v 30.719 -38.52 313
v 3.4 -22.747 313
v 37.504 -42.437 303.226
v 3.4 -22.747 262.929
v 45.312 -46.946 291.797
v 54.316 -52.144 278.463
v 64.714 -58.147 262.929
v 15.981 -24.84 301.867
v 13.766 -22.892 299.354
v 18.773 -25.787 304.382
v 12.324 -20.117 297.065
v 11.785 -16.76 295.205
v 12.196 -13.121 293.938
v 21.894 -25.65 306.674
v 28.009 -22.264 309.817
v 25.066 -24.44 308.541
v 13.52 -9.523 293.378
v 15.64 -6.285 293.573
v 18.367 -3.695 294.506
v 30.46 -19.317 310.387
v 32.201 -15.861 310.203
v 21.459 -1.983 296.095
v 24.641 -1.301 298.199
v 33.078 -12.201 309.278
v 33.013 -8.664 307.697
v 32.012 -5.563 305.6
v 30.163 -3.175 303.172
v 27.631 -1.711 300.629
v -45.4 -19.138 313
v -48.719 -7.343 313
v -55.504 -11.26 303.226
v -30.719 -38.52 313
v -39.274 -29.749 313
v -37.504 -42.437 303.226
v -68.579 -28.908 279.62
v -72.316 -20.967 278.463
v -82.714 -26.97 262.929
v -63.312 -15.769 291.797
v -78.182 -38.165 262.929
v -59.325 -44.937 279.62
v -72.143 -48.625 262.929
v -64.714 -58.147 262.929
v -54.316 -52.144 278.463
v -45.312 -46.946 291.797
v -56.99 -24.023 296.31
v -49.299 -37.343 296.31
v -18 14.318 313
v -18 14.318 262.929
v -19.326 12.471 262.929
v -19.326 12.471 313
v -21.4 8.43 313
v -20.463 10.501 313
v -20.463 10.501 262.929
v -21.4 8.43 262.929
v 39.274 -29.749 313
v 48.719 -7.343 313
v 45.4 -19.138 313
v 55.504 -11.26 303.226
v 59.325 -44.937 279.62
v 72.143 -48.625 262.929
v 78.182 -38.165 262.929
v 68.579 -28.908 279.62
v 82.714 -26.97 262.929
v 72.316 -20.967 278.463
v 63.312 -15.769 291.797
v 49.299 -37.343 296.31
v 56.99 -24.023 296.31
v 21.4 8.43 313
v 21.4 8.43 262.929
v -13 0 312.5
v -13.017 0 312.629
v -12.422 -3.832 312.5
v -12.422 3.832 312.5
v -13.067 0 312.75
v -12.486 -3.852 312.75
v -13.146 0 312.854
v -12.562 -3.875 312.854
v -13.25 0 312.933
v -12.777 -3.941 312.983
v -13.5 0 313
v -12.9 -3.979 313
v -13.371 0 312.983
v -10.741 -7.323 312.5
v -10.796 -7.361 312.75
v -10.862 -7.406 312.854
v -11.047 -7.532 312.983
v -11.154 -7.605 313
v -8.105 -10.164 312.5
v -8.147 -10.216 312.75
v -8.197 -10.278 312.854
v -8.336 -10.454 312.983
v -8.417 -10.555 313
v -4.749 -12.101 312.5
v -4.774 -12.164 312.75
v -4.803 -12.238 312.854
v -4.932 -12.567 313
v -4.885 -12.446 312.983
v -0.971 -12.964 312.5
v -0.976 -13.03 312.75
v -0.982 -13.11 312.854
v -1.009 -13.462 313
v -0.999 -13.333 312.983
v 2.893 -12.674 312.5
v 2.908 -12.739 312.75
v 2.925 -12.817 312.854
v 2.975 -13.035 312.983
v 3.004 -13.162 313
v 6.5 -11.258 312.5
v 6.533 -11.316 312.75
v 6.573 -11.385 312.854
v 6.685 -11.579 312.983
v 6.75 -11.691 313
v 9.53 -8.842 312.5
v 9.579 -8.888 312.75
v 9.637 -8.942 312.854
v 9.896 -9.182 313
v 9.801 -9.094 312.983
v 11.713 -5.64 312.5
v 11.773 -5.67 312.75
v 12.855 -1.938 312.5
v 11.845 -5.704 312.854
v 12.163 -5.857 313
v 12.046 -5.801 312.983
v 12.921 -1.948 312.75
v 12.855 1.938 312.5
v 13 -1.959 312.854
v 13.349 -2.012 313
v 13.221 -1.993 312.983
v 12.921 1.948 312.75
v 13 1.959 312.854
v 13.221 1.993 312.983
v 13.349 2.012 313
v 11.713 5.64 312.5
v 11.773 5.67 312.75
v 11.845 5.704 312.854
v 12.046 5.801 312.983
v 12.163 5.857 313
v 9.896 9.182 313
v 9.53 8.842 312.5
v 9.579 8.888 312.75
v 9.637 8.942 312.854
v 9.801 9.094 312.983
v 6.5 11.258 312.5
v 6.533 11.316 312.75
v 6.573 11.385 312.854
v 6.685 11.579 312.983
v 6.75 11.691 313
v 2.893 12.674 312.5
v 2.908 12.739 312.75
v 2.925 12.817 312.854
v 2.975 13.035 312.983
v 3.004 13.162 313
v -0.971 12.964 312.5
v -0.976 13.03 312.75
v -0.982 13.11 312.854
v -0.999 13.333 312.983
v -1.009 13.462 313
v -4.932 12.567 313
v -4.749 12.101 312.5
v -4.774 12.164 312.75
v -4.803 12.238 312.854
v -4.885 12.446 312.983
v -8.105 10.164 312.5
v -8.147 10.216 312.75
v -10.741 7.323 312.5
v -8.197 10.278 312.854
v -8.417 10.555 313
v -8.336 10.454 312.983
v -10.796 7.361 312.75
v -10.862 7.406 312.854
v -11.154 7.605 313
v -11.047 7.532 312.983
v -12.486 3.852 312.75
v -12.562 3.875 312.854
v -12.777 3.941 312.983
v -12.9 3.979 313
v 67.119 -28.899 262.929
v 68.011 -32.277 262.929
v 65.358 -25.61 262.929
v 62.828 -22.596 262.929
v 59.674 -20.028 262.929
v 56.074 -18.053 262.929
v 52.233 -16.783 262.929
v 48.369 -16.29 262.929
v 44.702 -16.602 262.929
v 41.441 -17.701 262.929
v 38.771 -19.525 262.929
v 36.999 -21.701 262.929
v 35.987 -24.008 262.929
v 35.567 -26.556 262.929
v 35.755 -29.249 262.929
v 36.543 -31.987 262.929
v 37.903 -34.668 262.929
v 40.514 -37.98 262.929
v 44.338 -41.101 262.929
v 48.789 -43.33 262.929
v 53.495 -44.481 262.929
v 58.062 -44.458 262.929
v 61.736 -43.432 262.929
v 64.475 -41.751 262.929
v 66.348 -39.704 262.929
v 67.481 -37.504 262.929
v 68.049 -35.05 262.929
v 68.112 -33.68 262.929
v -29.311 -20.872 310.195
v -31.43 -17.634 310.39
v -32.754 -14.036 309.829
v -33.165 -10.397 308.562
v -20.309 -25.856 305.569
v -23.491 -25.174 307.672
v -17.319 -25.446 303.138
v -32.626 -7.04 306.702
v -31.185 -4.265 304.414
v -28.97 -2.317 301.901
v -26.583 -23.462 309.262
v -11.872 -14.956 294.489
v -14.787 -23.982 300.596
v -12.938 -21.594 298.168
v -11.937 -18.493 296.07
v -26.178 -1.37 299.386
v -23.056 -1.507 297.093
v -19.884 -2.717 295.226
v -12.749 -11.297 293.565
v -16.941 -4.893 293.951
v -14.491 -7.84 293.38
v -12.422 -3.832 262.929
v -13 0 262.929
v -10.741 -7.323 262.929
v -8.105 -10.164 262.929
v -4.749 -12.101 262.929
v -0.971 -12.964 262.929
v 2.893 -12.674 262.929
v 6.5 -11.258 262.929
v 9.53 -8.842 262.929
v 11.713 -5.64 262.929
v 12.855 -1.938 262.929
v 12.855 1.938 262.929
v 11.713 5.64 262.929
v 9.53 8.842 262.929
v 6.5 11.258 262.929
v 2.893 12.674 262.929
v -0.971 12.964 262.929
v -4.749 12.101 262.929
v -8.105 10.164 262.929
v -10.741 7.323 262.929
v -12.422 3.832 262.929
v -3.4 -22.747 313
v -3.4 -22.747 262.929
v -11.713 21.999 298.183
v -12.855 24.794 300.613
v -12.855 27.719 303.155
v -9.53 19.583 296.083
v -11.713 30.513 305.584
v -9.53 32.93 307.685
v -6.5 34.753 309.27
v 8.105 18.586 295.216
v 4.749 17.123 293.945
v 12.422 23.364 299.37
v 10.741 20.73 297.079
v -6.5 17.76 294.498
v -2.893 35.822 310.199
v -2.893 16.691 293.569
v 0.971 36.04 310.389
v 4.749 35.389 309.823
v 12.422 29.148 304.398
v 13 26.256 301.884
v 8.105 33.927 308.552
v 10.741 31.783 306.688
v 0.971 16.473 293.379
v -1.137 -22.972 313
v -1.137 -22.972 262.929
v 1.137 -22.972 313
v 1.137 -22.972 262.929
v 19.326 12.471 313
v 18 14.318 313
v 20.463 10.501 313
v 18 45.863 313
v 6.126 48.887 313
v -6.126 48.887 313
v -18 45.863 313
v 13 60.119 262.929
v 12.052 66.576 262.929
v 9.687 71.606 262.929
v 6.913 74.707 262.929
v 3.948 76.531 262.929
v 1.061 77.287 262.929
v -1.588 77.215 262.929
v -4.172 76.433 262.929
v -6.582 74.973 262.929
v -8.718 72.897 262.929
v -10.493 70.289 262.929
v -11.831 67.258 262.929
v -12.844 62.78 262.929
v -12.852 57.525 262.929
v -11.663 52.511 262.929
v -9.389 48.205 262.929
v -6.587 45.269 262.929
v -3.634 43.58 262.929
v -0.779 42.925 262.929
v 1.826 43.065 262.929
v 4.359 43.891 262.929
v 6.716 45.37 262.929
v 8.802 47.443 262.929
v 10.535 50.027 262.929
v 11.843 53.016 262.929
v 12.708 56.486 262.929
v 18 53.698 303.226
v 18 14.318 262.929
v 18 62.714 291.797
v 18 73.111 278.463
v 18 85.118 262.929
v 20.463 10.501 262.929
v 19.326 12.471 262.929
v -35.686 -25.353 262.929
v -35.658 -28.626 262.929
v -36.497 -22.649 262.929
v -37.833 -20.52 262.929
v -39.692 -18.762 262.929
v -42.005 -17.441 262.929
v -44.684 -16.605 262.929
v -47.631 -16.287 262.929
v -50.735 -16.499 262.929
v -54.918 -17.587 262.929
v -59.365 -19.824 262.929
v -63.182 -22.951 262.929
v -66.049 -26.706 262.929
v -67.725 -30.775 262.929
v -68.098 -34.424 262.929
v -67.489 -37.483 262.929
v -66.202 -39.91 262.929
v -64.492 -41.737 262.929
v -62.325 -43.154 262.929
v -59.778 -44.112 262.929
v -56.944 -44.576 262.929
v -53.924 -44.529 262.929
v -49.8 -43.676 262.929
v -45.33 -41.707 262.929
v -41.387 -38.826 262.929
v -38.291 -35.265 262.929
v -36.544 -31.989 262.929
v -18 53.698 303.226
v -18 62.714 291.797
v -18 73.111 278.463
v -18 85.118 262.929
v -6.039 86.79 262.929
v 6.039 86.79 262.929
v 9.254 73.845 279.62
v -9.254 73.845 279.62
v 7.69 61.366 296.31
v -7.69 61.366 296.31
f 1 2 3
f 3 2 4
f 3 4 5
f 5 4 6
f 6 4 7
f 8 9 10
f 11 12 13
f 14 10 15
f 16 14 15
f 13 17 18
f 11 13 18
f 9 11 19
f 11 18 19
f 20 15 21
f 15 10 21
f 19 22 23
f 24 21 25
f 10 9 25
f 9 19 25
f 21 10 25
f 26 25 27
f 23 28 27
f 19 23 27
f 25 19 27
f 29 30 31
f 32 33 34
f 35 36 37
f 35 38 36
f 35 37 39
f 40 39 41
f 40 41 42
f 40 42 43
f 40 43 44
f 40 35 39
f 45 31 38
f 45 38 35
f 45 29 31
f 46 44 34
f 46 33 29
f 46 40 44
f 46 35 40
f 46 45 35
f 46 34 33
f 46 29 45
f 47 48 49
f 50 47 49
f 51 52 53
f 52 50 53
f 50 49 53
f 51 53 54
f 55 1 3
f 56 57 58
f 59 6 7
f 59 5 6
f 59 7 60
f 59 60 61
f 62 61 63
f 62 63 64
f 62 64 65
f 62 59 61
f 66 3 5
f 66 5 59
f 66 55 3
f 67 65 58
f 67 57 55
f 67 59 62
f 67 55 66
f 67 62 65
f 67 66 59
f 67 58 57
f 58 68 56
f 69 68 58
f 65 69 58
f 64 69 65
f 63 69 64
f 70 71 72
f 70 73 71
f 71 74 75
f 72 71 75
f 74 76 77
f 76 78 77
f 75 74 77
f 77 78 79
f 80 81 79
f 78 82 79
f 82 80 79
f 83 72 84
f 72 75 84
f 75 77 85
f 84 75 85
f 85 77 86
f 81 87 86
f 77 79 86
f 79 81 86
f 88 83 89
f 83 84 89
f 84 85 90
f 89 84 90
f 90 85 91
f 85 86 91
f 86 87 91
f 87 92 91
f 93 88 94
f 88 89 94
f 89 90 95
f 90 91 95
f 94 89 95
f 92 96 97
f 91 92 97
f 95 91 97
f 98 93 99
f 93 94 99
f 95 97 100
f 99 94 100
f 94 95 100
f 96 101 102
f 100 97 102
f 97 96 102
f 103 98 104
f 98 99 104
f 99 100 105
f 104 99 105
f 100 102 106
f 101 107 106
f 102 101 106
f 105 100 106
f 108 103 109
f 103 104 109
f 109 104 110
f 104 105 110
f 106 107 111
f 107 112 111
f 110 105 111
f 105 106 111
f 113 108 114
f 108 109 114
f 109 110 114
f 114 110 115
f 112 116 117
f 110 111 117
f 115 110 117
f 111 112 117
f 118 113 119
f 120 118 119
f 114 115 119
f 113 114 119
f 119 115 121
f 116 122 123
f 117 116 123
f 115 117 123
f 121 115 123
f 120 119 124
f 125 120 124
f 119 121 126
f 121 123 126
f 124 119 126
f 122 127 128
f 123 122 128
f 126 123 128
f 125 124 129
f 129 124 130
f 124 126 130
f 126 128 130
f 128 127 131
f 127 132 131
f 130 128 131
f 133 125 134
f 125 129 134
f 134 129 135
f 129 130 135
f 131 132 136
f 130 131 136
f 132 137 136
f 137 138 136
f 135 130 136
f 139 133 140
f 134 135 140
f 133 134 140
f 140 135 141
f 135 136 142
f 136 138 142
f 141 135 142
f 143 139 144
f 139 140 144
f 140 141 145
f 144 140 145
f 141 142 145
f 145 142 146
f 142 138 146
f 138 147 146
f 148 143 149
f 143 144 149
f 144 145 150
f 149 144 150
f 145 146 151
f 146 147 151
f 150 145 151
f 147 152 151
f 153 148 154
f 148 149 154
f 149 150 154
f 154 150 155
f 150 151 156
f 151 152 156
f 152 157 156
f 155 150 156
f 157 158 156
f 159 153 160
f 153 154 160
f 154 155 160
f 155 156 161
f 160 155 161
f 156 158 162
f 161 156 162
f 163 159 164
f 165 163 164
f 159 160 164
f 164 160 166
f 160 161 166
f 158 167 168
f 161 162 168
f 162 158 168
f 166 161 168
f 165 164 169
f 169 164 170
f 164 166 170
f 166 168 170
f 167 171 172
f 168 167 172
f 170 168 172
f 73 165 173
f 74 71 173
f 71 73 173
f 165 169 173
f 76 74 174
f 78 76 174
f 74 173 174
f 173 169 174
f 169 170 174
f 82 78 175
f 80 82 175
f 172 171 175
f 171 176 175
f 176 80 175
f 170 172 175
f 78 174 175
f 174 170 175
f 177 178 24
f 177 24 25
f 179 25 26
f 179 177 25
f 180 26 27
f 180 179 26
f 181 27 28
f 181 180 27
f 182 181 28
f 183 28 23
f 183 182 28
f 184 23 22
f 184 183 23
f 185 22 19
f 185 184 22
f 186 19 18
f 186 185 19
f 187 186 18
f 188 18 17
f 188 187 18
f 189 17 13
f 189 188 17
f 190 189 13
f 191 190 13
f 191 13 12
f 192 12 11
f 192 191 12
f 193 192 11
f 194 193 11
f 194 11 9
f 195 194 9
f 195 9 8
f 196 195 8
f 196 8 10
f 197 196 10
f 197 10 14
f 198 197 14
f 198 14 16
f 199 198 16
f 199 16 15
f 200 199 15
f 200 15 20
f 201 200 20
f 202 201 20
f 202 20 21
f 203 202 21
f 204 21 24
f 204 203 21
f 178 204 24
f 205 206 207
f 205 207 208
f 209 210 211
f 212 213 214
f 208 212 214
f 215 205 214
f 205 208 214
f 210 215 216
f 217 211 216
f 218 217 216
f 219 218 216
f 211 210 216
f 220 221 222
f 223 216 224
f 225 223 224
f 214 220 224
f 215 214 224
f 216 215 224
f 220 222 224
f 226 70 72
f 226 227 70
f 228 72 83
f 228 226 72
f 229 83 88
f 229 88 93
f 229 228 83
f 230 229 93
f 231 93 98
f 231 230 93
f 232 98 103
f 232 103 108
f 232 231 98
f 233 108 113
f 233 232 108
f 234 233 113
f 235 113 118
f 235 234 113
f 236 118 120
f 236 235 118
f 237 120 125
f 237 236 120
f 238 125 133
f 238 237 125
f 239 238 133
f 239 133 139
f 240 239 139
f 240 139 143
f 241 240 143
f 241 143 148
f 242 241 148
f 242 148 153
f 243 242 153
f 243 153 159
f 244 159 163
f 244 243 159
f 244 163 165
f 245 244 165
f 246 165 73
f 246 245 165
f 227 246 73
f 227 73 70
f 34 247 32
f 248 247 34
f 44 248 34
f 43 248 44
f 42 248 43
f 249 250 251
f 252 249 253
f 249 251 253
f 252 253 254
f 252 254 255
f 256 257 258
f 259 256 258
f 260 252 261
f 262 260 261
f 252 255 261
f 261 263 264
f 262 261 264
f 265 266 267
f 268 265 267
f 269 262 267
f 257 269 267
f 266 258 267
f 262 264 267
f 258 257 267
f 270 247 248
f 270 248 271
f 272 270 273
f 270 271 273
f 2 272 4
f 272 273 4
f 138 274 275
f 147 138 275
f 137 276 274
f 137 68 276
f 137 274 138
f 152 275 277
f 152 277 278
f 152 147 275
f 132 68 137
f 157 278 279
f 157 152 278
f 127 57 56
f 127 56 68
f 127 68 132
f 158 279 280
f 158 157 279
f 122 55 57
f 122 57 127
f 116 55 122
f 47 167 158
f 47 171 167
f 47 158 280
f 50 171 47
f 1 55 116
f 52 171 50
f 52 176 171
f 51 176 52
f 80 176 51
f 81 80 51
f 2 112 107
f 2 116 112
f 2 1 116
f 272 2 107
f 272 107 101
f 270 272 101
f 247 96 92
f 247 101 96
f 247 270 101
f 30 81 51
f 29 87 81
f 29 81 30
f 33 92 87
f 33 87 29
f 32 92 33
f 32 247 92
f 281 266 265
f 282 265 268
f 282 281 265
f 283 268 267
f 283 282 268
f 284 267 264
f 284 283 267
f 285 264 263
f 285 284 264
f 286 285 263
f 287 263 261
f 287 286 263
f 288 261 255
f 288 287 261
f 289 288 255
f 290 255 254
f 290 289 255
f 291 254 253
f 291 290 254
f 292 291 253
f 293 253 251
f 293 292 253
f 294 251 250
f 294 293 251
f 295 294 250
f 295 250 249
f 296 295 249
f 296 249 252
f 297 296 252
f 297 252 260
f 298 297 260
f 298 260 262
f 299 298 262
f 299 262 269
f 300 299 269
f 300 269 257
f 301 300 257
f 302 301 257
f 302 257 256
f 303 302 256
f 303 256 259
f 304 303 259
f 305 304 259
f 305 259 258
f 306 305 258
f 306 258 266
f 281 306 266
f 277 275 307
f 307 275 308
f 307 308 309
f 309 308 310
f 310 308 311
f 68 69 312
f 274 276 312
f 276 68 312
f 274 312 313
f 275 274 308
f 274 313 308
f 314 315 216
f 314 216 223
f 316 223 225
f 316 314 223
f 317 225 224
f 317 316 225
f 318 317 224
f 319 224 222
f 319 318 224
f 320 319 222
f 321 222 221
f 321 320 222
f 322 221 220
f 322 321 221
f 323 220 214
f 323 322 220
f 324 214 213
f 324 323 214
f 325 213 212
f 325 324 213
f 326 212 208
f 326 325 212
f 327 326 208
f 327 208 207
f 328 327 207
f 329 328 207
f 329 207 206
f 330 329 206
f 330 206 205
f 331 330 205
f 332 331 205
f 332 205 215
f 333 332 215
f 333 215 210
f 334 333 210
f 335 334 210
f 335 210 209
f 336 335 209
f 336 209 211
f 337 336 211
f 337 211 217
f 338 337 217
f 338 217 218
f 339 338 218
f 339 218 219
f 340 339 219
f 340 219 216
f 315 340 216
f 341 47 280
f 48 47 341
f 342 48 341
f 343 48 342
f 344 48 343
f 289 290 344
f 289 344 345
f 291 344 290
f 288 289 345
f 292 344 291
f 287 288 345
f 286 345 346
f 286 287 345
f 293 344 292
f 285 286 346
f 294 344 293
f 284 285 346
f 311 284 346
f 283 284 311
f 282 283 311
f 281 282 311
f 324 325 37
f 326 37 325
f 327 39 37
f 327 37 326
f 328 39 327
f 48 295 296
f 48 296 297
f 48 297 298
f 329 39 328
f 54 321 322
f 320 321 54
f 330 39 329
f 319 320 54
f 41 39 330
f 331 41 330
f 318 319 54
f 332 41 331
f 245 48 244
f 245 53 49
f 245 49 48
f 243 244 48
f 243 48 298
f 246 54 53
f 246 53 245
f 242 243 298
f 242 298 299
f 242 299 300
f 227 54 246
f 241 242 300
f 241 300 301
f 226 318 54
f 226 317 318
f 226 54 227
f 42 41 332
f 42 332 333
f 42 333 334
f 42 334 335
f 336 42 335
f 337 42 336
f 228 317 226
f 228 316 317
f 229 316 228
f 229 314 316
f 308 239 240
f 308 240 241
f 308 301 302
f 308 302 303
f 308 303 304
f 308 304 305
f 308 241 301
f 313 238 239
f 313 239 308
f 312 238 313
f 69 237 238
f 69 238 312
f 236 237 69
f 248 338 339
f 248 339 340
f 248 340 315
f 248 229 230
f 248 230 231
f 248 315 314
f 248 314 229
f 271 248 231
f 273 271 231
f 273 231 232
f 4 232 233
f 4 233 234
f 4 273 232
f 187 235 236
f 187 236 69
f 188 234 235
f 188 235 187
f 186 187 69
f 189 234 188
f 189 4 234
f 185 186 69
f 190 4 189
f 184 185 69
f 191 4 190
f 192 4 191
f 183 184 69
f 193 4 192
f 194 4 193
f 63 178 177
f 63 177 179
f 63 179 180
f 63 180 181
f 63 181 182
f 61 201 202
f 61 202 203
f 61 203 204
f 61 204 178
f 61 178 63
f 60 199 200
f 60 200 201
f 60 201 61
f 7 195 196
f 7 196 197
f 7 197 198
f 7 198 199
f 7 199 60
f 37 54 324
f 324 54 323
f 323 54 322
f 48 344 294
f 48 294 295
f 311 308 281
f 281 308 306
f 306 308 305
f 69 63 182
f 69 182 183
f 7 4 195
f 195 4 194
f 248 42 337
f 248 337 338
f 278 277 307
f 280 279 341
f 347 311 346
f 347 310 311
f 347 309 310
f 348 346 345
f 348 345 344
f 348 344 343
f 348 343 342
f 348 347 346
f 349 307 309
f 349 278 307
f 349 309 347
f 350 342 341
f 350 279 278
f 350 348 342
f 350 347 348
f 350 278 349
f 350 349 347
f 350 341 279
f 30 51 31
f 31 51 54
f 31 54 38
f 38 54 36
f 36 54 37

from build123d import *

# Parameters (mm, degrees)
PAD003_DEPTH                = 100
PAD002_DEPTH                = 100
PAD001_DEPTH                = 100
CYLINDER009_R               = 13
CYLINDER009_DEPTH           = 400
CYLINDER009_ROLL_ANGLE      = -23.419924
CYLINDER009_PITCH_ANGLE     = -34.667447
CYLINDER009_PLACEMENT_ANGLE = 7.402808
CYLINDER012_R               = 13
CYLINDER012_DEPTH           = 400
CYLINDER012_PLACEMENT_ANGLE = 41
CYLINDER013_R               = 13
CYLINDER013_DEPTH           = 400
CYLINDER013_ROLL_ANGLE      = -23.419924
CYLINDER013_PITCH_ANGLE     = 34.667447
CYLINDER013_PLACEMENT_ANGLE = -7.402808


with BuildPart() as body004:
    # Sketch005 → Pad003 (new body)
    with BuildSketch(Plane.XY):
        with BuildLine():
            ThreePointArc((86.165943, -28.96332), (78.724727, 45.451743), (18, 89.103555))
            Line((18, 14.317821), (18, 89.103555))
            ThreePointArc((21.399597, 8.429547), (19.918584, 11.5), (18, 14.317821))
            Line((21.399597, 8.429547), (86.165943, -28.96332))
        make_face()
    extrude(amount=PAD003_DEPTH)


with BuildPart() as body003:
    # Sketch006 → Pad002 (new body)
    with BuildSketch(Plane.XY):
        with BuildLine():
            Line((-3.399597, -22.747368), (-68.165943, -60.140235))
            ThreePointArc((-68.165943, -60.140235), (0, -90.903485), (68.165943, -60.140235))
            Line((3.399597, -22.747368), (68.165943, -60.140235))
            ThreePointArc((-3.399597, -22.747368), (0, -23), (3.399597, -22.747368))
        make_face()
    extrude(amount=PAD002_DEPTH)


with BuildPart() as fusion002:
    # Sketch004 → Pad001 (new body)
    with BuildSketch(Plane.XY):
        with BuildLine():
            Line((-21.399597, 8.429547), (-86.165943, -28.96332))
            ThreePointArc((-18, 89.103555), (-78.724727, 45.451743), (-86.165943, -28.96332))
            Line((-18, 14.317821), (-18, 89.103555))
            ThreePointArc((-18, 14.317821), (-19.918584, 11.5), (-21.399597, 8.429547))
        make_face()
    extrude(amount=PAD001_DEPTH)

    # Fusion002: union Body004, Body003
    add(body004.part)
    add(body003.part)


with BuildPart() as fusion002_1:
    # Fusion002 placement: moved
    add(fusion002.part.moved(Location((0, 0, 240))))


with BuildPart() as cylinder009:
    # Cylinder009 → Cylinder009 (new body)
    with BuildSketch(Plane.XY):
        Circle(CYLINDER009_R)
    extrude(amount=CYLINDER009_DEPTH)


with BuildPart() as cylinder009_1:
    # Cylinder009 roll: moved
    add(cylinder009.part.rotate(Axis((0, 0, 0), (1, 0, 0)), CYLINDER009_ROLL_ANGLE))


with BuildPart() as cylinder009_2:
    # Cylinder009 pitch: moved
    add(cylinder009_1.part.rotate(Axis((0, 0, 0), (0, 1, 0)), CYLINDER009_PITCH_ANGLE))


with BuildPart() as cylinder009_3:
    # Cylinder009 placement: moved
    add(cylinder009_2.part.moved(Location((250, -144.34, 0))).rotate(Axis((250, -144.34, 0), (0, 0, 1)), CYLINDER009_PLACEMENT_ANGLE))


with BuildPart() as cylinder012:
    # Cylinder012 → Cylinder012 (new body)
    with BuildSketch(Plane.XY):
        Circle(CYLINDER012_R)
    extrude(amount=CYLINDER012_DEPTH)


with BuildPart() as cylinder012_1:
    # Cylinder012 placement: moved
    add(cylinder012.part.moved(Location((0, 288.68, 0))).rotate(Axis((0, 288.68, 0), (1, 0, 0)), CYLINDER012_PLACEMENT_ANGLE))


with BuildPart() as tripod001:
    # Cylinder013 → Cylinder013 (new body)
    with BuildSketch(Plane.XY):
        Circle(CYLINDER013_R)
    extrude(amount=CYLINDER013_DEPTH)


with BuildPart() as tripod001_1:
    # Cylinder013 roll: moved
    add(tripod001.part.rotate(Axis((0, 0, 0), (1, 0, 0)), CYLINDER013_ROLL_ANGLE))


with BuildPart() as tripod001_2:
    # Cylinder013 pitch: moved
    add(tripod001_1.part.rotate(Axis((0, 0, 0), (0, 1, 0)), CYLINDER013_PITCH_ANGLE))


with BuildPart() as tripod001_3:
    # Cylinder013 placement: moved
    add(tripod001_2.part.moved(Location((-250, -144.34, 0))).rotate(Axis((-250, -144.34, 0), (0, 0, 1)), CYLINDER013_PLACEMENT_ANGLE))

    # Fusion001: union Cylinder009, Cylinder012
    add(cylinder009_3.part)
    add(cylinder012_1.part)


with BuildPart() as f_41_tripodsupport:
    # Sketch001 → Revolution002 (revolve)
    with BuildSketch(Plane.XZ):
        with BuildLine():
            Line((-49.269007, 313), (-13.5, 313))
            ThreePointArc((-13, 312.5), (-13.146447, 312.853553), (-13.5, 313))
            Line((-13, 312.5), (-13, 262.929281))
            Line((-13, 262.929281), (-87, 262.929281))
            Line((-87, 262.929281), (-49.269007, 313))
        make_face()
    revolve(axis=Axis((0, 0, 0), (0, 0, 1)))

    # Cut004: cut Tripod001
    add(tripod001_3.part, mode=Mode.SUBTRACT)

    # Cut005: cut Fusion002
    add(fusion002_1.part, mode=Mode.SUBTRACT)


solid = f_41_tripodsupport.part
